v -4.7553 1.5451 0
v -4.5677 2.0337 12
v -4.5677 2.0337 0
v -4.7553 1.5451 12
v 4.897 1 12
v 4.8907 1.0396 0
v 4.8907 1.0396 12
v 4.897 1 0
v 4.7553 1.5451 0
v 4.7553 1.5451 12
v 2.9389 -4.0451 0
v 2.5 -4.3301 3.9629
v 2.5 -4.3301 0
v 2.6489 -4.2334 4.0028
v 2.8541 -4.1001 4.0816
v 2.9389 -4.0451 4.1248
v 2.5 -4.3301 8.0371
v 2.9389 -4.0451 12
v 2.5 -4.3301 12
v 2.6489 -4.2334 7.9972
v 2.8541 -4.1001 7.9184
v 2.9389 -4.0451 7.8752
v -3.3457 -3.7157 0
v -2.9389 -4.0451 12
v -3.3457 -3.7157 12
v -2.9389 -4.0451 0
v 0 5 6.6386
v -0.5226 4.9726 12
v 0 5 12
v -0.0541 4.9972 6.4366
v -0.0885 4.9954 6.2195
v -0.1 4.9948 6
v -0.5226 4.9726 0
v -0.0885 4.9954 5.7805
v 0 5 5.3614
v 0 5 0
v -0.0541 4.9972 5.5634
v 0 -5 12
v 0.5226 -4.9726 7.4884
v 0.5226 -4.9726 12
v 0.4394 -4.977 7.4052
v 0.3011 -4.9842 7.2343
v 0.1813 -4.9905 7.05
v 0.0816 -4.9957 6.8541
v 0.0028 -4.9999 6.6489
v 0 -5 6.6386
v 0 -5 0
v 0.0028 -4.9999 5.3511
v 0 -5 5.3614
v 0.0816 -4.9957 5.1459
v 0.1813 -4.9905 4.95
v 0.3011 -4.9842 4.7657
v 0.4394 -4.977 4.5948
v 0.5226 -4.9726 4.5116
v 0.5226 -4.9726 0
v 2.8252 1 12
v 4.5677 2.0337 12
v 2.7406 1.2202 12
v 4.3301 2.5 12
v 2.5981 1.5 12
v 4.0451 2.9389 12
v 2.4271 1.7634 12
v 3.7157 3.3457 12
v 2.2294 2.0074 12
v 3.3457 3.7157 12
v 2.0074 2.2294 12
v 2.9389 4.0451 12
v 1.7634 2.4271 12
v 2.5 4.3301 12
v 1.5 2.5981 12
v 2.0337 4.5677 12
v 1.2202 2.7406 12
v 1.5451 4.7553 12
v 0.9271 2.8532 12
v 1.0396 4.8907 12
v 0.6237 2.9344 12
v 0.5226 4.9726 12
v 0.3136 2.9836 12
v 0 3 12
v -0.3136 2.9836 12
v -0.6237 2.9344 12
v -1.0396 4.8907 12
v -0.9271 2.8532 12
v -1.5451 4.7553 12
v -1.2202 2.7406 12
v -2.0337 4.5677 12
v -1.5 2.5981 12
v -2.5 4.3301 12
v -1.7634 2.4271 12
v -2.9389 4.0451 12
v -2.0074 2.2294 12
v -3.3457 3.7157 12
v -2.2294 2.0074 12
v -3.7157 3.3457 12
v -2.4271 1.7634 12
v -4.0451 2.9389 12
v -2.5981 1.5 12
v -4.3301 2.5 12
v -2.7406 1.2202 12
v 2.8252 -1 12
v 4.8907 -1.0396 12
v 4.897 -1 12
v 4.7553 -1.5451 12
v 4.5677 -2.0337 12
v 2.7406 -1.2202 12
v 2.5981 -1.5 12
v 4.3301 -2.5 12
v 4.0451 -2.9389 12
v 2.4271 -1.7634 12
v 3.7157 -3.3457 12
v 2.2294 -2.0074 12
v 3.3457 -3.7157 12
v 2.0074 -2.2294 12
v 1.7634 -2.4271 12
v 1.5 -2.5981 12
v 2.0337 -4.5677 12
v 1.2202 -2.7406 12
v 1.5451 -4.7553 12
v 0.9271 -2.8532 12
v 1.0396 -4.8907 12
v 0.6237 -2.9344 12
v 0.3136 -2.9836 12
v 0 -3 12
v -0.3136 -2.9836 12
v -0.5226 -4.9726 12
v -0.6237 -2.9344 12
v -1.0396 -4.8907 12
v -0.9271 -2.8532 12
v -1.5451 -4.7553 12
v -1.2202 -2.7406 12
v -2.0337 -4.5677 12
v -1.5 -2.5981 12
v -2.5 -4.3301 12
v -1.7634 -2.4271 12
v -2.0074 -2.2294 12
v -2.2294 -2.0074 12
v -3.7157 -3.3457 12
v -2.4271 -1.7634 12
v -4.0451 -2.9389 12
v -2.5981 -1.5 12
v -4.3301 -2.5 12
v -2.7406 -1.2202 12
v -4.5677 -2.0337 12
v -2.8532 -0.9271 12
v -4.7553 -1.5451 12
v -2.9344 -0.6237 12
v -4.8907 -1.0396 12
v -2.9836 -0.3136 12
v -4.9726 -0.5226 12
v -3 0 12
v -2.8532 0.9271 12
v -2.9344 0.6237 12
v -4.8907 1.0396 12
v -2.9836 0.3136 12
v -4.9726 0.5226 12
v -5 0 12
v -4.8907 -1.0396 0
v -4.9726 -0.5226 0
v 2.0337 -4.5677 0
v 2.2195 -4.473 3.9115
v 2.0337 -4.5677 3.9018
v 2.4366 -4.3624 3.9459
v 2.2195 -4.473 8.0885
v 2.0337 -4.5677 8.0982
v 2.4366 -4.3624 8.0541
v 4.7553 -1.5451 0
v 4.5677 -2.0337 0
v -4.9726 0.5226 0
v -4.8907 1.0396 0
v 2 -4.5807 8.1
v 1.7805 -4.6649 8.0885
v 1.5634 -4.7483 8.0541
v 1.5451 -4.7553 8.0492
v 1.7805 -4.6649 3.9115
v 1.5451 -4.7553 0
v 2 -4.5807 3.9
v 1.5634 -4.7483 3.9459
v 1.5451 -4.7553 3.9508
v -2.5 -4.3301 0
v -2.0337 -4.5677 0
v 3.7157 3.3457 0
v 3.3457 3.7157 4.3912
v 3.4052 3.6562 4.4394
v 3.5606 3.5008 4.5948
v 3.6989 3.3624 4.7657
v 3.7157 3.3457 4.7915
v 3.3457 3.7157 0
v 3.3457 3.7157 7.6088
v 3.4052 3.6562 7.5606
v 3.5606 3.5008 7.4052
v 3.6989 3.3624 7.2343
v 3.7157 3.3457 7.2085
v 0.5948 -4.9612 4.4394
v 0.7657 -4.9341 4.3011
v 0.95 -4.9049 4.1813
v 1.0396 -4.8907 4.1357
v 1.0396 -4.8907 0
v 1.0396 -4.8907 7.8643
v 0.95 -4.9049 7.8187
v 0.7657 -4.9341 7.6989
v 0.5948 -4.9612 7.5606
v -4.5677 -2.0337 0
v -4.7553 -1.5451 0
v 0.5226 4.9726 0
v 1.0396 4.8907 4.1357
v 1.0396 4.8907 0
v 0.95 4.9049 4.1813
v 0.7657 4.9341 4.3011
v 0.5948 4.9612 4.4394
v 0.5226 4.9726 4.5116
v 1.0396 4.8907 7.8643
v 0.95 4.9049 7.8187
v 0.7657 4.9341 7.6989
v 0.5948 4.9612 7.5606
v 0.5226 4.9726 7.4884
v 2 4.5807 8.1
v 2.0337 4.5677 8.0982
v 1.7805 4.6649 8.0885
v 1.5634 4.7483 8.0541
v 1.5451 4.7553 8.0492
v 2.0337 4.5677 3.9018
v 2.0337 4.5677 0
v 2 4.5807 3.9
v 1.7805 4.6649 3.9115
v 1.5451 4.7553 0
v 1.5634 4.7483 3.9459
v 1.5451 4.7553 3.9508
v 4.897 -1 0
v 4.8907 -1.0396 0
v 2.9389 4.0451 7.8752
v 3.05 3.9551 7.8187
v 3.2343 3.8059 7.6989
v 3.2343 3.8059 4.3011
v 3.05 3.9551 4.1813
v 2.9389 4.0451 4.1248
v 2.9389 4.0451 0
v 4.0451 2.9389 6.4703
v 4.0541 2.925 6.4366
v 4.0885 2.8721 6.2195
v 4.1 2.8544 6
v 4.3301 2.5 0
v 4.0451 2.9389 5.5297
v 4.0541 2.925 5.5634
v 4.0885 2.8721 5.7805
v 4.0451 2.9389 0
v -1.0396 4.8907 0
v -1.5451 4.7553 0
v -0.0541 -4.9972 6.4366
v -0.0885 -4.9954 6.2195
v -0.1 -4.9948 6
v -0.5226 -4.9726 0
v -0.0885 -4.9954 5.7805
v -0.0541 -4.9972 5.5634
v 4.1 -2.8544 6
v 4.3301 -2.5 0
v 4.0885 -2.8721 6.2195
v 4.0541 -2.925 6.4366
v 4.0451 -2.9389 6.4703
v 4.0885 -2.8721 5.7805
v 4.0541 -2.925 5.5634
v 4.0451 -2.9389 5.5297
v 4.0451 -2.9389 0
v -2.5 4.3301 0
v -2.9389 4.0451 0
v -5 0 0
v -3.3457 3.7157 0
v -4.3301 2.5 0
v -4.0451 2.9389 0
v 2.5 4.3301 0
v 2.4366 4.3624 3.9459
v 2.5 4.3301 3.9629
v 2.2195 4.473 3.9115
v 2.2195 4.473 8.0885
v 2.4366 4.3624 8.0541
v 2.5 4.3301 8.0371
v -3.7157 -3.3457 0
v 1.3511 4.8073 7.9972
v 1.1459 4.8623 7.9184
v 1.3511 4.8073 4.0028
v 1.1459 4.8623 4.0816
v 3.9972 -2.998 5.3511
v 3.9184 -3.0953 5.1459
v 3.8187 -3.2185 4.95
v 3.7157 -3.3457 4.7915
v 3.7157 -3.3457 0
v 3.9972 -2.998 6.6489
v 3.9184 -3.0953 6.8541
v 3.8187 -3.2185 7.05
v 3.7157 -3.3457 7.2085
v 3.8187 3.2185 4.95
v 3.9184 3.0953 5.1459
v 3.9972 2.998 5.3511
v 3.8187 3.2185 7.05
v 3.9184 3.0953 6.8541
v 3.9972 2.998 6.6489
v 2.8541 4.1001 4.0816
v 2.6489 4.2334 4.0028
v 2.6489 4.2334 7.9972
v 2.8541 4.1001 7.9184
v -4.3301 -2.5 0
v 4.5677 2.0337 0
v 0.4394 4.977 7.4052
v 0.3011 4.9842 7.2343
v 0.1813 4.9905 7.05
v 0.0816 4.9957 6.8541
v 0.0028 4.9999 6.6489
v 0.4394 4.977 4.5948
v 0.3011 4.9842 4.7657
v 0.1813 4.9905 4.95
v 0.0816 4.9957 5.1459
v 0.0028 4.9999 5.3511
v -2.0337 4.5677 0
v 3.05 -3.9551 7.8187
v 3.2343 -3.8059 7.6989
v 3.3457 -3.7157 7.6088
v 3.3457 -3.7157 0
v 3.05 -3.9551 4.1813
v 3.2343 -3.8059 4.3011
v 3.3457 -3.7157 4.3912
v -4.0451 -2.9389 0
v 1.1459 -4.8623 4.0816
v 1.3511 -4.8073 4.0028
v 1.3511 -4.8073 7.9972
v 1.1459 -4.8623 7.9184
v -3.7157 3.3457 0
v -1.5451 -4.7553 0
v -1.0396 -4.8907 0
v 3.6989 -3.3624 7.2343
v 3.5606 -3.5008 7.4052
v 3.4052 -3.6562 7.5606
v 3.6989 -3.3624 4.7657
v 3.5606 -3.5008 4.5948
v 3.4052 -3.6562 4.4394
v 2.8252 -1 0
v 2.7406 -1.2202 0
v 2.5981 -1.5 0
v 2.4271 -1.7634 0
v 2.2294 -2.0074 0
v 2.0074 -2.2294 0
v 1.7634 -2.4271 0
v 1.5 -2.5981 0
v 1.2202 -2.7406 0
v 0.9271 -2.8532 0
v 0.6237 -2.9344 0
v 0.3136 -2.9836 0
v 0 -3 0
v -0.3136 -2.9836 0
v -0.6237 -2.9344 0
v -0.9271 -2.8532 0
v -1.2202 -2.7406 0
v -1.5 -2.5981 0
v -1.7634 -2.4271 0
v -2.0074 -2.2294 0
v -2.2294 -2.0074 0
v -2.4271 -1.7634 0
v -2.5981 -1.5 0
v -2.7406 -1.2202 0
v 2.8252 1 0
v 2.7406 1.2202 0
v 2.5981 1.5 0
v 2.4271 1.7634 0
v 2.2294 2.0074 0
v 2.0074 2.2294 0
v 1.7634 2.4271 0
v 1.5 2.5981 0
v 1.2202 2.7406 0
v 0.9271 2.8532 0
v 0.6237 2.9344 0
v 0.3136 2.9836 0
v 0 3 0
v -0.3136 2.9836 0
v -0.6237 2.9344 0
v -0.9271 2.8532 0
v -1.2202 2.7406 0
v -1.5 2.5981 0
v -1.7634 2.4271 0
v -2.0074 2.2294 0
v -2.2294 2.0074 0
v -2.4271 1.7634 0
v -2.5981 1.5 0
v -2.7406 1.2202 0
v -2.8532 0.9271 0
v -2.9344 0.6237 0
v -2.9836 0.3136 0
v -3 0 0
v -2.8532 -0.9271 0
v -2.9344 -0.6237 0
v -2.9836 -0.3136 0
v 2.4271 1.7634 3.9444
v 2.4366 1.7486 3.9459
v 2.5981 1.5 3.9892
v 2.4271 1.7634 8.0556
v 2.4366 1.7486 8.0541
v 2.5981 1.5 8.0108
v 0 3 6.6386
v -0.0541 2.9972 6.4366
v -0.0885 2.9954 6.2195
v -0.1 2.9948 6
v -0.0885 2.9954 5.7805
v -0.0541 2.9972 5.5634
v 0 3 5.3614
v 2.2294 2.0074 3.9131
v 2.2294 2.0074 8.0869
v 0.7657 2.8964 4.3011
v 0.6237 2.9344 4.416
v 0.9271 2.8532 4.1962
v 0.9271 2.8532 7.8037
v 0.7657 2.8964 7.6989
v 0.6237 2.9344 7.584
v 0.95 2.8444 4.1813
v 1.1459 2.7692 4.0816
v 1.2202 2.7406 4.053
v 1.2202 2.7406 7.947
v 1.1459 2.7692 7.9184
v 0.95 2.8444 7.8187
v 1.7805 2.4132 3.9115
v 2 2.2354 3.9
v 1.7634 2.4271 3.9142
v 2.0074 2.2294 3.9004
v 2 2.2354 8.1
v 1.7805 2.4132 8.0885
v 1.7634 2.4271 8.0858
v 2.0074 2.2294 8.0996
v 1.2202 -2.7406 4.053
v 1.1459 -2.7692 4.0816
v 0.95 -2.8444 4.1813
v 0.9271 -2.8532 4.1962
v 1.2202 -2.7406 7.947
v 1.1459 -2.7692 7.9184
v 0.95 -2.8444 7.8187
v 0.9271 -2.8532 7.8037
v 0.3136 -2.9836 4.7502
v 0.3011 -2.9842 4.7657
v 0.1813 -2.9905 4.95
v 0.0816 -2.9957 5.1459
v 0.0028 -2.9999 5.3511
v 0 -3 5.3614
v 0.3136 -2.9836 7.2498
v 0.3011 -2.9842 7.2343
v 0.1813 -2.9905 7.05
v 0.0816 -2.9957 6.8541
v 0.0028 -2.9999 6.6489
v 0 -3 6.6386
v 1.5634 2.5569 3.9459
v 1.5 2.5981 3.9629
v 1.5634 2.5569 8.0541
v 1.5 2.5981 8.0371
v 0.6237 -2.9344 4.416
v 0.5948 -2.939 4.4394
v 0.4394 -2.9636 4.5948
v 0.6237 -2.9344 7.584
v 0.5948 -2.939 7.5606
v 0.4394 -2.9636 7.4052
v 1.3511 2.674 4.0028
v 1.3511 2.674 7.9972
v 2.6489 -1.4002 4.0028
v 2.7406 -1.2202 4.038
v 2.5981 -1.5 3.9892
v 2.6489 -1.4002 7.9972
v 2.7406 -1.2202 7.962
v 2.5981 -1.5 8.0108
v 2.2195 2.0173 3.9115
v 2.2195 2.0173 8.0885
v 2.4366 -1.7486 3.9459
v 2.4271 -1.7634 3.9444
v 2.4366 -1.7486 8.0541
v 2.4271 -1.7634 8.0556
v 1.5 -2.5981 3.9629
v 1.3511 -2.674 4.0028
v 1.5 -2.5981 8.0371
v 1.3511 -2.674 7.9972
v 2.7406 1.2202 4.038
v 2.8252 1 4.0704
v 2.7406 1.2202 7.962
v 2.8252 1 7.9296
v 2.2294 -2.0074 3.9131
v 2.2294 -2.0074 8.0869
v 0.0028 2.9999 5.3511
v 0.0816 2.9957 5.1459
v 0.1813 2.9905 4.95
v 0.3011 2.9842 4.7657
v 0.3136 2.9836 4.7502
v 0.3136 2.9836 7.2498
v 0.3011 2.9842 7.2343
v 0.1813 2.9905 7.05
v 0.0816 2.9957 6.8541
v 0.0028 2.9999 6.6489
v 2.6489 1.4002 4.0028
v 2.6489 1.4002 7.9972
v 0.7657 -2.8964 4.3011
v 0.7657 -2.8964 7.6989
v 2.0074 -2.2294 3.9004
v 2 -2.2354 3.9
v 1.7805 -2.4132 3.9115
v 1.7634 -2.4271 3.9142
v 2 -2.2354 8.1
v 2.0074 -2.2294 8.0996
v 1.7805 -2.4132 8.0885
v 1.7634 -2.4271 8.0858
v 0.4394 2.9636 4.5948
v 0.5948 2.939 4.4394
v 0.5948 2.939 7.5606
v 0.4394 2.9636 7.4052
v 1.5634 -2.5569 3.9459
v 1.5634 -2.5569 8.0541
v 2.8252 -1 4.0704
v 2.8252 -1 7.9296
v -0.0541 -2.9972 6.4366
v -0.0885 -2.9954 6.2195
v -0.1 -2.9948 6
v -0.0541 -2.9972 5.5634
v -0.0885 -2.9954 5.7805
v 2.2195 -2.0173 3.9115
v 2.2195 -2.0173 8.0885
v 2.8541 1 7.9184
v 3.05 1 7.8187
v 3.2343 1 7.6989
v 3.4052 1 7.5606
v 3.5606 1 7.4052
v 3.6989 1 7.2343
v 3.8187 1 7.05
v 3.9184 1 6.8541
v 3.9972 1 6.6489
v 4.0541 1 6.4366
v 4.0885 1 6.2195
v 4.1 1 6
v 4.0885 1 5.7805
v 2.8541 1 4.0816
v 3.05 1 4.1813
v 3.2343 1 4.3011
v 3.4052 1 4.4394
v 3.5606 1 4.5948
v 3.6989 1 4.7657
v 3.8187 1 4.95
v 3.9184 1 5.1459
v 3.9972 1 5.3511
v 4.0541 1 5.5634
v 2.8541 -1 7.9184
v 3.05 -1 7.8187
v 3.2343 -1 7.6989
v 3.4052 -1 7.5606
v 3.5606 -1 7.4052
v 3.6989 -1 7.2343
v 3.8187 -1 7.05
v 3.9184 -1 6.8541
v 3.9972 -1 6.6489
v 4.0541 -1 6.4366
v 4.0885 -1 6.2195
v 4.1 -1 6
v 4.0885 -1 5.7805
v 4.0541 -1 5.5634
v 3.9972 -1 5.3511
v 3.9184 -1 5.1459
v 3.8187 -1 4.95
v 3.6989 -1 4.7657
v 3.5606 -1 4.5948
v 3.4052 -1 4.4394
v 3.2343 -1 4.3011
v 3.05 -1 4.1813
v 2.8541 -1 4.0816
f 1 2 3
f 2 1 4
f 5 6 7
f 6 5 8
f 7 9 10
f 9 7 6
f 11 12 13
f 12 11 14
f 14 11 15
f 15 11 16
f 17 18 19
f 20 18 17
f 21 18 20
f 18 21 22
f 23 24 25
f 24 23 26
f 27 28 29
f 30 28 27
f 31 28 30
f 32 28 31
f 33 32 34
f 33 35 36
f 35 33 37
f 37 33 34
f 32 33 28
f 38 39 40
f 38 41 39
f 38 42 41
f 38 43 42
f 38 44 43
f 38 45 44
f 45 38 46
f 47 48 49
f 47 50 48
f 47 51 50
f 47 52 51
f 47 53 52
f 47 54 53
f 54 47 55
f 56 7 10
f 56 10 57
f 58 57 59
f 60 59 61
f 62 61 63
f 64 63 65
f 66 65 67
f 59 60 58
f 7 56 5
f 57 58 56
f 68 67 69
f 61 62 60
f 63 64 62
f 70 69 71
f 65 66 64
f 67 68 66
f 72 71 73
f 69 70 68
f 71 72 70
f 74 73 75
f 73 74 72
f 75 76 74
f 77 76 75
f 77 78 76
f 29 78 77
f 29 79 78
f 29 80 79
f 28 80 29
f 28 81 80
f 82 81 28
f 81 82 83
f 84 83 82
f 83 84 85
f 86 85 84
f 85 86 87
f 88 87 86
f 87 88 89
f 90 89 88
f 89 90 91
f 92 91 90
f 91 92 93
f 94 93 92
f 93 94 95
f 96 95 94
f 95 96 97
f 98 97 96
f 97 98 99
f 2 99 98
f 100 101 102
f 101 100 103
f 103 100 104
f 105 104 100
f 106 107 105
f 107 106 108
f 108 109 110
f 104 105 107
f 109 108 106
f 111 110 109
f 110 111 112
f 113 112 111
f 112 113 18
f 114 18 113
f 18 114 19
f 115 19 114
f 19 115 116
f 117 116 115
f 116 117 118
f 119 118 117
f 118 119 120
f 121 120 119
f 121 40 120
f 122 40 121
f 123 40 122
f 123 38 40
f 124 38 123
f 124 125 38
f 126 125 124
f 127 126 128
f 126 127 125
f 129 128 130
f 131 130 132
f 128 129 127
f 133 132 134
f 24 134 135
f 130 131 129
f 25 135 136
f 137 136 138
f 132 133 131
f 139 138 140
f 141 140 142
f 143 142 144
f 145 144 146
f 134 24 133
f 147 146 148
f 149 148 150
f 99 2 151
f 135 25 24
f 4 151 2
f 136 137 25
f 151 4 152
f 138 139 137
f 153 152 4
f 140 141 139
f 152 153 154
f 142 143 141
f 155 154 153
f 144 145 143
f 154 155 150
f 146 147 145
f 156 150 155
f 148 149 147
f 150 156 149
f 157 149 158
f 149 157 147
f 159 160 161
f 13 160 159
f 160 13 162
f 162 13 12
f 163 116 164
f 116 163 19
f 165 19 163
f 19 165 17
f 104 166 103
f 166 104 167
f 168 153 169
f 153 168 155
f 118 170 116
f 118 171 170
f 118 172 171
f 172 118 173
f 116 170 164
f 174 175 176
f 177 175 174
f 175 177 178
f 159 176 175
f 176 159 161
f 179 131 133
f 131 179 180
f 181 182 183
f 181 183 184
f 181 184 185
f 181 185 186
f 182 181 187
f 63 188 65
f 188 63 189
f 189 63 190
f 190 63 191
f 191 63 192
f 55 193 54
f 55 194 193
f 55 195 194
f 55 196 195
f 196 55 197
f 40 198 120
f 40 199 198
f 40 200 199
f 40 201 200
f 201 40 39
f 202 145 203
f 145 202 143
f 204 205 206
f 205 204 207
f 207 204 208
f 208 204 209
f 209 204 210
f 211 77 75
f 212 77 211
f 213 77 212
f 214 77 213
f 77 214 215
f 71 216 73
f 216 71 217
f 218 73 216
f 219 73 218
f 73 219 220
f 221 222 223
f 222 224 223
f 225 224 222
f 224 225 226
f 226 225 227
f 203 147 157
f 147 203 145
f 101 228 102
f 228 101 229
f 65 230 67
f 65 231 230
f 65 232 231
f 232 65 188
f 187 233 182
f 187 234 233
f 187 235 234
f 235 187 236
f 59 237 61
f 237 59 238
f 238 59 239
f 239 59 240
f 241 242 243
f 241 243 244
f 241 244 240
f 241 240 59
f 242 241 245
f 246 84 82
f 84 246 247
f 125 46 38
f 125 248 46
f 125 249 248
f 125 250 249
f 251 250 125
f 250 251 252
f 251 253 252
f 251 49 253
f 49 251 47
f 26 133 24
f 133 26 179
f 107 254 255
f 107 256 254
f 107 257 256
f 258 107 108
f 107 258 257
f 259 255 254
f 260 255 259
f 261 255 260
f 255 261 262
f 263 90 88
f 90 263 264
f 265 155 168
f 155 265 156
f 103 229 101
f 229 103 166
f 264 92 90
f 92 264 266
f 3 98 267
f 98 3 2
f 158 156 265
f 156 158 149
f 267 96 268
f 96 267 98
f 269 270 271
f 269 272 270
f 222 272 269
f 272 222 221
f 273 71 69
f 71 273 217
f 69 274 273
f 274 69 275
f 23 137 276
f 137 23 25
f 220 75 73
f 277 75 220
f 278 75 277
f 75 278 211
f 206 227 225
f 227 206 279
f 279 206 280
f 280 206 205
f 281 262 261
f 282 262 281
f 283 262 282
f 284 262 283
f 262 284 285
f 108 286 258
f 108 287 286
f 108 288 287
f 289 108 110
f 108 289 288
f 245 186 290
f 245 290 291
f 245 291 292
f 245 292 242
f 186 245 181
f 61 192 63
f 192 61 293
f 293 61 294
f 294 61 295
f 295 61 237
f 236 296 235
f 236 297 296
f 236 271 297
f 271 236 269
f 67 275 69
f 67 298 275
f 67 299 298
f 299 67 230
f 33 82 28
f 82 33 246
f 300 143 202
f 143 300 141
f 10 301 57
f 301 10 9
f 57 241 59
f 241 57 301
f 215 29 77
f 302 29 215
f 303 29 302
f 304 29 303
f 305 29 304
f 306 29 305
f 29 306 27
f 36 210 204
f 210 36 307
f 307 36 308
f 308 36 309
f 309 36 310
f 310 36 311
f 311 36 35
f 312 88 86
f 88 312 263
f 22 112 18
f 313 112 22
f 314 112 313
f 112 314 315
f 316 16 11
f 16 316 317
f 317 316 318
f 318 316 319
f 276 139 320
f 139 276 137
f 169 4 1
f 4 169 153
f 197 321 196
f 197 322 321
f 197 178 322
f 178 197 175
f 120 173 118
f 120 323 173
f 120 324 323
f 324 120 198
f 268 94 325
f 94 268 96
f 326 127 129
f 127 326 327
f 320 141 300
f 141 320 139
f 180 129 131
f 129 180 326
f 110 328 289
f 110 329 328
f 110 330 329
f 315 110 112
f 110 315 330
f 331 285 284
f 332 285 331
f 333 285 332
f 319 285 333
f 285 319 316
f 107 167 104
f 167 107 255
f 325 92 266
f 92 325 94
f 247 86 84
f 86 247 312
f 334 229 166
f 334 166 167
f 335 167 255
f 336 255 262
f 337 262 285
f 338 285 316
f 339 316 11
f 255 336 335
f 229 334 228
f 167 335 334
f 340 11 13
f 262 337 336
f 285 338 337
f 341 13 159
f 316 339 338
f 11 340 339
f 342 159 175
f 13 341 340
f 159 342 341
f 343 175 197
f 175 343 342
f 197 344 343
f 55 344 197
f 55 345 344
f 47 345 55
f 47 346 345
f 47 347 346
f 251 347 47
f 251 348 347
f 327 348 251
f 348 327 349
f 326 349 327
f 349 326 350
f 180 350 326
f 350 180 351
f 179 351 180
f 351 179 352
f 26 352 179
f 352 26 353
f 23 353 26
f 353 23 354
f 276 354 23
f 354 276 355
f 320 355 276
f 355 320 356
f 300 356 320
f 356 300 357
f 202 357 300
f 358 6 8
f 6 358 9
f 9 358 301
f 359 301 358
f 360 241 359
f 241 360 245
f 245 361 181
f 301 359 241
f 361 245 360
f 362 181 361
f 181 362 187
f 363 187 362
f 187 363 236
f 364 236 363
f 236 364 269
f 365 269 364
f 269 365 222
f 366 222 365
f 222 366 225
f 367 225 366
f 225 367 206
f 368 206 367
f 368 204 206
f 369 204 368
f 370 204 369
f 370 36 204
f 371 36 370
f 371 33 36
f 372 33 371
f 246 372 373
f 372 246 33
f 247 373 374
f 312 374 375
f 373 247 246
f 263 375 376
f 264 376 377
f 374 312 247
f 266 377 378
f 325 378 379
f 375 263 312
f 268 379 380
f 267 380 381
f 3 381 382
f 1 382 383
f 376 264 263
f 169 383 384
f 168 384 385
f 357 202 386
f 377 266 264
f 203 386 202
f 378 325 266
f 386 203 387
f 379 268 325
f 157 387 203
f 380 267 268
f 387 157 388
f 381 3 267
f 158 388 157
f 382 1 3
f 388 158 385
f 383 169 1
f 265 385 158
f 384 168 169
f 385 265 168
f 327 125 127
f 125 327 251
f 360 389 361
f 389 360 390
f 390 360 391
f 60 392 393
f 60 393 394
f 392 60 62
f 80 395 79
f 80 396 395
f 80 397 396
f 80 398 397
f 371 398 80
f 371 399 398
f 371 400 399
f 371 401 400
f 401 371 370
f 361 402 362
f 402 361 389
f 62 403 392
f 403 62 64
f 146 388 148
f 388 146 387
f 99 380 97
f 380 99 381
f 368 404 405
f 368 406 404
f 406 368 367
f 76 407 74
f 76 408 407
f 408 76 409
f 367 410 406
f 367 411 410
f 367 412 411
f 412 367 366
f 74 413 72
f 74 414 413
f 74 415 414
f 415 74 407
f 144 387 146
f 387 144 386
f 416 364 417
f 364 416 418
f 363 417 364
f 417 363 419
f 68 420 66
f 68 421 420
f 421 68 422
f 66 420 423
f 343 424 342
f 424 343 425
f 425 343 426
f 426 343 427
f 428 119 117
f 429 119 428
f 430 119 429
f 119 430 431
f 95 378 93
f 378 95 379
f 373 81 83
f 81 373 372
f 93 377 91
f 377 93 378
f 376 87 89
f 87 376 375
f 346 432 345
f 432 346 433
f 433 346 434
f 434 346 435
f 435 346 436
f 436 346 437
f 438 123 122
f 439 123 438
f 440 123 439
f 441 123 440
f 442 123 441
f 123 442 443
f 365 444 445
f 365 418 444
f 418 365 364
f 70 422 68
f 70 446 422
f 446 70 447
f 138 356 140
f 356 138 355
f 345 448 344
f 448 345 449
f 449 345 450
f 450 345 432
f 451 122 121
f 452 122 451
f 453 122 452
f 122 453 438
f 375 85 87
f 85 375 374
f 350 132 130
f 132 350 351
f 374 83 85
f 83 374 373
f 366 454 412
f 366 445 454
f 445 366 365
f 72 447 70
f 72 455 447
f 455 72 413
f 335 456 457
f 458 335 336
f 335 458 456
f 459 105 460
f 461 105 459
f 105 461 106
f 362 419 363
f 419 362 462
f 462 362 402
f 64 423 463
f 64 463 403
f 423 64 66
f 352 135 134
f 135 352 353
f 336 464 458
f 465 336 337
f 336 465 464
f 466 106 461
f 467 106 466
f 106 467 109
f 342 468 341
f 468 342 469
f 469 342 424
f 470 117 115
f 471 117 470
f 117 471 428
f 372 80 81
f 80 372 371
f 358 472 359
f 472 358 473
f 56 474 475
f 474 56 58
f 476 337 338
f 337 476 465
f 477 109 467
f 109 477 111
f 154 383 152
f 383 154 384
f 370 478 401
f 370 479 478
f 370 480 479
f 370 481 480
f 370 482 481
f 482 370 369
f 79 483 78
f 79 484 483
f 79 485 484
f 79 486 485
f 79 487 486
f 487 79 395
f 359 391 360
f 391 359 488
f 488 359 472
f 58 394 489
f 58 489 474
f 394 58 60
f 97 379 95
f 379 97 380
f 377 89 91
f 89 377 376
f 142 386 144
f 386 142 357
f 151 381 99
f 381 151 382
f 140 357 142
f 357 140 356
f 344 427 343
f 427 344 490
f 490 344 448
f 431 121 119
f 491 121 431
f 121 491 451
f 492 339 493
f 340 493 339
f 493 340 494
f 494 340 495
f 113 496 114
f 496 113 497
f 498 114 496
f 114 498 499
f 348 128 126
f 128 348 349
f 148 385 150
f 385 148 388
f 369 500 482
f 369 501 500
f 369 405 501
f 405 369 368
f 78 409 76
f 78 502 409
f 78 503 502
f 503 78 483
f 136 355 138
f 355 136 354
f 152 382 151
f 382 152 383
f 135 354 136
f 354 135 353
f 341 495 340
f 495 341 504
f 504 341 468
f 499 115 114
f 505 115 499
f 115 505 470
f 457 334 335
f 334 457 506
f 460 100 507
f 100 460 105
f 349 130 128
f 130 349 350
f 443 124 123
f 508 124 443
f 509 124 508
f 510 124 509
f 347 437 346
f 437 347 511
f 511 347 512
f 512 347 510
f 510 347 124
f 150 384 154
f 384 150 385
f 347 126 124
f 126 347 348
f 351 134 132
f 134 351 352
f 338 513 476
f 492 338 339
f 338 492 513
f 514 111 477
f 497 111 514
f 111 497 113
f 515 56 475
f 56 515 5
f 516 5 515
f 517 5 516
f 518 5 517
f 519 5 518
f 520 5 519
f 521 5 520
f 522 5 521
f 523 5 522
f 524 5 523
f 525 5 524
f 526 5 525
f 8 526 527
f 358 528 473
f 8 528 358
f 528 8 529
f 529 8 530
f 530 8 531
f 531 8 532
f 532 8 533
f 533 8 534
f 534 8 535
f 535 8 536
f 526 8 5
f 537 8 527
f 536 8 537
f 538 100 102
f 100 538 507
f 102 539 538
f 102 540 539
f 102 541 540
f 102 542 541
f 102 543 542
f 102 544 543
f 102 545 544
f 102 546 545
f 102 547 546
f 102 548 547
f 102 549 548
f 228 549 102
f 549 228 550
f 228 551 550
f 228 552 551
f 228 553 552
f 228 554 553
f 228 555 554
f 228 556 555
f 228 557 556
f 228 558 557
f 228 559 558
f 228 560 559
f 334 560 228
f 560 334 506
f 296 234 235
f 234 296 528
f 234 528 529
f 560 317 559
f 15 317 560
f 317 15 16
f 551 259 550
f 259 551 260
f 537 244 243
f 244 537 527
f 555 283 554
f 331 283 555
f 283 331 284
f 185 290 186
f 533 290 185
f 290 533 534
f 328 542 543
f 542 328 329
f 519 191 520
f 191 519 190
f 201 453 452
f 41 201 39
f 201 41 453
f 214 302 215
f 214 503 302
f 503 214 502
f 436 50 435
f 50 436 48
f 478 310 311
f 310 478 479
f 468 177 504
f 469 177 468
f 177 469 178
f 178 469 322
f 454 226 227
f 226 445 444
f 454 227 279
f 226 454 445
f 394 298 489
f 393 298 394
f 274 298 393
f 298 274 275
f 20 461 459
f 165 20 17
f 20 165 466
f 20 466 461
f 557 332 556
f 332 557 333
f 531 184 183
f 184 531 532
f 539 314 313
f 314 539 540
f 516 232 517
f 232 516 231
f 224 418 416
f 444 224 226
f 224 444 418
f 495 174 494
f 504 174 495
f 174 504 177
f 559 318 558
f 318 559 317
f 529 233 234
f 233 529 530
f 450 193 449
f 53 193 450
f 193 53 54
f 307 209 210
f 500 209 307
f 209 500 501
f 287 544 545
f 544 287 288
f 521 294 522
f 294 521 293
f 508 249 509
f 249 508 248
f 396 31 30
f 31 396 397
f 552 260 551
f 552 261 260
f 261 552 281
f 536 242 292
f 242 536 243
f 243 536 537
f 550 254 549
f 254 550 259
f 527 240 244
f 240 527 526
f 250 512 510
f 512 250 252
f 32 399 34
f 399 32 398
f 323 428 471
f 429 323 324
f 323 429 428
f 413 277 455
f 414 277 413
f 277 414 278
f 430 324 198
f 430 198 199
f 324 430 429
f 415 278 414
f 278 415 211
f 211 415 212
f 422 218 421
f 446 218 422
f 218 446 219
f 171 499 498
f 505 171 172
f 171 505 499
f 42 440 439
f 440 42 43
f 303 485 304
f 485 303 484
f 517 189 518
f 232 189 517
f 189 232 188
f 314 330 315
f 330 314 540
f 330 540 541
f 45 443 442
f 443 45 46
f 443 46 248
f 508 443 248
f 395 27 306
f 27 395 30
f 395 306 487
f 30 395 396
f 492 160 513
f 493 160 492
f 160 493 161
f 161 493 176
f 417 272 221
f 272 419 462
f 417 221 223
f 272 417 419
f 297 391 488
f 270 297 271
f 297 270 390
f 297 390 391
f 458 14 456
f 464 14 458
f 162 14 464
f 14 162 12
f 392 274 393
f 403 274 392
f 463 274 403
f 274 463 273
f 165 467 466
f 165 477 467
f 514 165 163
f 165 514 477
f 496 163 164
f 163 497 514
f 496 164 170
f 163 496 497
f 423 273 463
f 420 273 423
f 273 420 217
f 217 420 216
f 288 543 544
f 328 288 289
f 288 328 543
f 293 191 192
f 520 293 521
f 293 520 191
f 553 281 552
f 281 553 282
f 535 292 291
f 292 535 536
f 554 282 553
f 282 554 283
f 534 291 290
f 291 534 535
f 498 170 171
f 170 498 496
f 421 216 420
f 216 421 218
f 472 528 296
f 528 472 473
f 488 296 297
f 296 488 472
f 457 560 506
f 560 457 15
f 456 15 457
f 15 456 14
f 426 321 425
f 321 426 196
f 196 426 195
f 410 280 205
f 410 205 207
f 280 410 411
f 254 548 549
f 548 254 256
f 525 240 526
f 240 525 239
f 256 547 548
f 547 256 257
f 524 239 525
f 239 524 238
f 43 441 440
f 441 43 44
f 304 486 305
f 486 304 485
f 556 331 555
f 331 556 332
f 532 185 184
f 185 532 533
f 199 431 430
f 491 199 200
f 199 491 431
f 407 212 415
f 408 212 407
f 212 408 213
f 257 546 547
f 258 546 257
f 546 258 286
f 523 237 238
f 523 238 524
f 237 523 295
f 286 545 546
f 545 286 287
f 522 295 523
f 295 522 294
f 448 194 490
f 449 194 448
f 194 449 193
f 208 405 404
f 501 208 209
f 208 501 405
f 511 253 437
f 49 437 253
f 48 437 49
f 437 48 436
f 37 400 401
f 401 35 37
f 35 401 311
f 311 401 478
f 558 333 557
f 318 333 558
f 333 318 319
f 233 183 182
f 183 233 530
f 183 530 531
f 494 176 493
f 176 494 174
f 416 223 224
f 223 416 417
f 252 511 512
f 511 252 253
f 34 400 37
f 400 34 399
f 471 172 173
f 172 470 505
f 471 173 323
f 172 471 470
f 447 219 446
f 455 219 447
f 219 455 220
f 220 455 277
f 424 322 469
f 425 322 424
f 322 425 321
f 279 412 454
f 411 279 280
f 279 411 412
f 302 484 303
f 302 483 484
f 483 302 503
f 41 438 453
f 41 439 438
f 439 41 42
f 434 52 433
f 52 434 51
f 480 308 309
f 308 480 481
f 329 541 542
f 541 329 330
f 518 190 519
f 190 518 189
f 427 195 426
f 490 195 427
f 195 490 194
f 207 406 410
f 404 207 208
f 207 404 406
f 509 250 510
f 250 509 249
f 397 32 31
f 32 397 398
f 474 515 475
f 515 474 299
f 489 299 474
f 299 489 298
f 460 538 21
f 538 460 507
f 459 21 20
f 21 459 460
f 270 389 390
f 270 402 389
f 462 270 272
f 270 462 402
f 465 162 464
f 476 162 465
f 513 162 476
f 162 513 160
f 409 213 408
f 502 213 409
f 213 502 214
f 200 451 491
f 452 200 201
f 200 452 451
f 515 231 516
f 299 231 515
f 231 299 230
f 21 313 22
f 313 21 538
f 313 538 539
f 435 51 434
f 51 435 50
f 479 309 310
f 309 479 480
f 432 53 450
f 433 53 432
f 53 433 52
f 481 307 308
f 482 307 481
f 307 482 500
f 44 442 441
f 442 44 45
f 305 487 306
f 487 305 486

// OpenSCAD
// C-style pipe clamp.
$fn = 60;
eps = 0.02;
pipe_d = 6;
wall = 2;
outer_d = pipe_d + 2 * wall;
width = 12;
slit = 2;
difference() {
    cylinder(d=outer_d,h=width);
    translate([0,0,-eps]) cylinder(d=pipe_d,h=width+2*eps);
    translate([0,-slit/2,-eps]) cube([outer_d/2+eps,slit,width+2*eps]);
    translate([outer_d/2-3,-outer_d/2-eps,width/2]) rotate([-90,0,0]) cylinder(d=4.2,h=outer_d+2*eps);
}
